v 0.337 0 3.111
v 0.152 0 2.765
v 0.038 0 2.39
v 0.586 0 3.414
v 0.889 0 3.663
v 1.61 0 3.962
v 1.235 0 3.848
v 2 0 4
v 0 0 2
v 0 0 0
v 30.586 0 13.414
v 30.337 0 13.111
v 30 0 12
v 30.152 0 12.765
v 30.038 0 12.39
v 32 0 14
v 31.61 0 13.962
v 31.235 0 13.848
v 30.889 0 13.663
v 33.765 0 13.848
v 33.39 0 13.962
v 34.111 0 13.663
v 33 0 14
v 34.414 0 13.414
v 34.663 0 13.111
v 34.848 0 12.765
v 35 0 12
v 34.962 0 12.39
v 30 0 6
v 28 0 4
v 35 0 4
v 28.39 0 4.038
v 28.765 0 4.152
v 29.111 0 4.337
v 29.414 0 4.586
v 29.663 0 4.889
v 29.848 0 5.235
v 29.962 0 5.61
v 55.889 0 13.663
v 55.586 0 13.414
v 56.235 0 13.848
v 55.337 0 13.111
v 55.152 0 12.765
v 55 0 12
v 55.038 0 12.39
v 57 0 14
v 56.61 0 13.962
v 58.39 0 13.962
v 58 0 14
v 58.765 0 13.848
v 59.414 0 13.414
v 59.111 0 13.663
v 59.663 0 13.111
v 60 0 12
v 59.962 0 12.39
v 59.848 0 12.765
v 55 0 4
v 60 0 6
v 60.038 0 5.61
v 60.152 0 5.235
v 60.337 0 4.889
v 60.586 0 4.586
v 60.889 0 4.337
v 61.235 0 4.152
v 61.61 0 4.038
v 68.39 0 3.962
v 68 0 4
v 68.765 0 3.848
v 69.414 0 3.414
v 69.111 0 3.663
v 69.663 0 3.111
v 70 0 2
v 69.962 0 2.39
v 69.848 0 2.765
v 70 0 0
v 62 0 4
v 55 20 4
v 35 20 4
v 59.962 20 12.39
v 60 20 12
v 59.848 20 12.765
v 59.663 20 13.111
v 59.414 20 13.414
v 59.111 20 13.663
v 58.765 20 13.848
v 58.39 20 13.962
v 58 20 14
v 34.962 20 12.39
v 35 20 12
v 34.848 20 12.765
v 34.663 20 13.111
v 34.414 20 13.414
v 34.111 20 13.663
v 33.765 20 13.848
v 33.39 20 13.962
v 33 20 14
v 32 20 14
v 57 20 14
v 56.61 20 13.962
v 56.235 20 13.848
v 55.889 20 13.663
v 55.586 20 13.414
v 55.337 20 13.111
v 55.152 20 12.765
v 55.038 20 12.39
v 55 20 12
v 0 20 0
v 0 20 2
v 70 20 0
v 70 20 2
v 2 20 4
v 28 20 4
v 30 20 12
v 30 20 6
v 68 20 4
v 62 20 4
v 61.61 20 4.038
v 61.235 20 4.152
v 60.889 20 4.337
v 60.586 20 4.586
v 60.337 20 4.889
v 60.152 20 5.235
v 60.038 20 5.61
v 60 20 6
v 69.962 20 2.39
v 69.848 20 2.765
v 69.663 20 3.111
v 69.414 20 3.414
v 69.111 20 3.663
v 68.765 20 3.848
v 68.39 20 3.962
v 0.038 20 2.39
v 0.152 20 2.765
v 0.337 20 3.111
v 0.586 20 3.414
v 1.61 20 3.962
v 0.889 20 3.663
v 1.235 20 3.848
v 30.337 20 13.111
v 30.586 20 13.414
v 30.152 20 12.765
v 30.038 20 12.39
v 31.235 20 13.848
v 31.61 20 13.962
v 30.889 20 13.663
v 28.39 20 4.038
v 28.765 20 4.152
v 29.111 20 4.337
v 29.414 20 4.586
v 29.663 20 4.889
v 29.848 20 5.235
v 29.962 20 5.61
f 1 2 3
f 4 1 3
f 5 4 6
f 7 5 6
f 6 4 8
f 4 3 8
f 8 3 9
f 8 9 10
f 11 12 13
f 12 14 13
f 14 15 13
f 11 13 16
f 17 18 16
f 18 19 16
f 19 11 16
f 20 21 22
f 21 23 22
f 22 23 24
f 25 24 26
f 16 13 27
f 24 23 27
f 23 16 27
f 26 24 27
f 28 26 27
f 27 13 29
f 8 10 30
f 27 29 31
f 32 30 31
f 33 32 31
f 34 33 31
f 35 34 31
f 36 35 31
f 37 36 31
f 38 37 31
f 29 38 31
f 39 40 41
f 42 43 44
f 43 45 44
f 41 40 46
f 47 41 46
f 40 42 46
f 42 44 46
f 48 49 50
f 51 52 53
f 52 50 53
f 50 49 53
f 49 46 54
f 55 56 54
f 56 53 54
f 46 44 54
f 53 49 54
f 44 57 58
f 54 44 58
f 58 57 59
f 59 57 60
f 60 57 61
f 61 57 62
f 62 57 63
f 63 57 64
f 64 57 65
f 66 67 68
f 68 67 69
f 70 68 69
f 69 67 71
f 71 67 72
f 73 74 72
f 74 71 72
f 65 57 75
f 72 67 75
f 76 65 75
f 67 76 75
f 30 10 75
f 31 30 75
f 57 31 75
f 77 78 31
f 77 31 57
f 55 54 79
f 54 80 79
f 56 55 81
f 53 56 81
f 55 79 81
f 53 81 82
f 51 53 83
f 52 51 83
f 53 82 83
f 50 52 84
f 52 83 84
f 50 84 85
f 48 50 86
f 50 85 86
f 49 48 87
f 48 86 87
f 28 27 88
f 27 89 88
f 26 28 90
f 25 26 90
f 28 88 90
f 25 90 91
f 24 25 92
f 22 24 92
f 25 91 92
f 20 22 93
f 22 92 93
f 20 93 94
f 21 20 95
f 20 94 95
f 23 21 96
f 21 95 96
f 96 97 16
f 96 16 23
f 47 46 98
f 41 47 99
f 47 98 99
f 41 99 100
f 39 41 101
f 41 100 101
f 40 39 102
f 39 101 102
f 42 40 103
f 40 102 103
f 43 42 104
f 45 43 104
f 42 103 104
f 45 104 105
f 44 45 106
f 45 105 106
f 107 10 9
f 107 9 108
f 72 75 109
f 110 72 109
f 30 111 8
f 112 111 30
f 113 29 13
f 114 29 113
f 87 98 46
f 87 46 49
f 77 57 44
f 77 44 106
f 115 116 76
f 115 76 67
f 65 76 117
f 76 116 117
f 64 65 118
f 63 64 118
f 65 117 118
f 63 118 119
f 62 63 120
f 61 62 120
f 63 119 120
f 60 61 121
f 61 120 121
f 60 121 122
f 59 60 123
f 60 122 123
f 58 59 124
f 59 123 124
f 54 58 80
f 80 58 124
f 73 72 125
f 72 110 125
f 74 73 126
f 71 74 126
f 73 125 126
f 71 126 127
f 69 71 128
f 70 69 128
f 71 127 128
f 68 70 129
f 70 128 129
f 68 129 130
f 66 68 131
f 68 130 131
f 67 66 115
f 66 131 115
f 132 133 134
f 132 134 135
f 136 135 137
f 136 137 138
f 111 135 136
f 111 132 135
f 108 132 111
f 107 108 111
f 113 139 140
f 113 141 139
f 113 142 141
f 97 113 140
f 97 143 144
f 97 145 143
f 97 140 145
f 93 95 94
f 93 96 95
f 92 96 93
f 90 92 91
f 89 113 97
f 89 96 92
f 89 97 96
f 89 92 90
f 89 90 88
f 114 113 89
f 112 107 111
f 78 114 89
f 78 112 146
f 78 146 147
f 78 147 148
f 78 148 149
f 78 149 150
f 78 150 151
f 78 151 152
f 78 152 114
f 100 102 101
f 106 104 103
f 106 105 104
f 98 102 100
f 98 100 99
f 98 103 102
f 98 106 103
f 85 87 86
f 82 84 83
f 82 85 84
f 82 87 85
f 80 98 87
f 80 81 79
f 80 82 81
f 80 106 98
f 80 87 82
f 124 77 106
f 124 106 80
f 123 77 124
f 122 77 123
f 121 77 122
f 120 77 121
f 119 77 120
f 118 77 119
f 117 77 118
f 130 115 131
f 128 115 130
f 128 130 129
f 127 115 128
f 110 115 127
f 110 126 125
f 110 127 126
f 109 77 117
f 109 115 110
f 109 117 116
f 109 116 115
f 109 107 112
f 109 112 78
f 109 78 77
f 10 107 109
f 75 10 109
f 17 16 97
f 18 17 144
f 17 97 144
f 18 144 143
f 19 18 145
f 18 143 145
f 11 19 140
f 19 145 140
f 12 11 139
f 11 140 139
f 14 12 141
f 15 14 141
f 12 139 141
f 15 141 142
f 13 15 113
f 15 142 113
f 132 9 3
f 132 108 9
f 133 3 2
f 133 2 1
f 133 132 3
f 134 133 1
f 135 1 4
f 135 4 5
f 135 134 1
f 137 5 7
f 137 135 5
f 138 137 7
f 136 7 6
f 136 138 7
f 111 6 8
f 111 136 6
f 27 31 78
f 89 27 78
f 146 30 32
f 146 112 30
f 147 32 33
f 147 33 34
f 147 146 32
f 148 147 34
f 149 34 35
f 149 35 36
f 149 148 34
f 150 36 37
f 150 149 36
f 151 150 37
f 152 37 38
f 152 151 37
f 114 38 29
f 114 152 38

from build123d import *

# Parameters (mm, degrees)
BOX002_W     = 20
BOX002_H     = 20
BOX002_DEPTH = 10
BOX001_W     = 30
BOX001_H     = 20
BOX001_DEPTH = 10
BOX_W        = 70
BOX_H        = 20
BOX_DEPTH    = 4
FILLET_R     = 2


with BuildPart() as cube002:
    # Box002 → Box002 (new body)
    with BuildSketch(Plane(origin=(35, 0, 4), x_dir=(1, 0, 0), z_dir=(0, 0, 1))):
        with Locations((10, 10)):
            Rectangle(BOX002_W, BOX002_H)
    extrude(amount=BOX002_DEPTH)


with BuildPart() as cube001:
    # Box001 → Box001 (new body)
    with BuildSketch(Plane(origin=(30, 0, 4), x_dir=(1, 0, 0), z_dir=(0, 0, 1))):
        with Locations((15, 10)):
            Rectangle(BOX001_W, BOX001_H)
    extrude(amount=BOX001_DEPTH)


with BuildPart() as fillet_body:
    # Box → Box (new body)
    with BuildSketch(Plane.XY):
        with Locations((35, 10)):
            Rectangle(BOX_W, BOX_H)
    extrude(amount=BOX_DEPTH)

    # Fusion: union Cube001
    add(cube001.part)

    # Cut: cut Cube002
    add(cube002.part, mode=Mode.SUBTRACT)

    # Fillet
    fillet_edges = [fillet_body.edges().sort_by_distance(p)[0] for p in [
        (0, 10, 4),
        (30, 10, 4),
        (70, 10, 4),
        (60, 10, 4),
        (30, 10, 14),
        (35, 10, 14),
        (55, 10, 14),
        (60, 10, 14),
    ]]
    fillet(fillet_edges, radius=FILLET_R)


solid = fillet_body.part
